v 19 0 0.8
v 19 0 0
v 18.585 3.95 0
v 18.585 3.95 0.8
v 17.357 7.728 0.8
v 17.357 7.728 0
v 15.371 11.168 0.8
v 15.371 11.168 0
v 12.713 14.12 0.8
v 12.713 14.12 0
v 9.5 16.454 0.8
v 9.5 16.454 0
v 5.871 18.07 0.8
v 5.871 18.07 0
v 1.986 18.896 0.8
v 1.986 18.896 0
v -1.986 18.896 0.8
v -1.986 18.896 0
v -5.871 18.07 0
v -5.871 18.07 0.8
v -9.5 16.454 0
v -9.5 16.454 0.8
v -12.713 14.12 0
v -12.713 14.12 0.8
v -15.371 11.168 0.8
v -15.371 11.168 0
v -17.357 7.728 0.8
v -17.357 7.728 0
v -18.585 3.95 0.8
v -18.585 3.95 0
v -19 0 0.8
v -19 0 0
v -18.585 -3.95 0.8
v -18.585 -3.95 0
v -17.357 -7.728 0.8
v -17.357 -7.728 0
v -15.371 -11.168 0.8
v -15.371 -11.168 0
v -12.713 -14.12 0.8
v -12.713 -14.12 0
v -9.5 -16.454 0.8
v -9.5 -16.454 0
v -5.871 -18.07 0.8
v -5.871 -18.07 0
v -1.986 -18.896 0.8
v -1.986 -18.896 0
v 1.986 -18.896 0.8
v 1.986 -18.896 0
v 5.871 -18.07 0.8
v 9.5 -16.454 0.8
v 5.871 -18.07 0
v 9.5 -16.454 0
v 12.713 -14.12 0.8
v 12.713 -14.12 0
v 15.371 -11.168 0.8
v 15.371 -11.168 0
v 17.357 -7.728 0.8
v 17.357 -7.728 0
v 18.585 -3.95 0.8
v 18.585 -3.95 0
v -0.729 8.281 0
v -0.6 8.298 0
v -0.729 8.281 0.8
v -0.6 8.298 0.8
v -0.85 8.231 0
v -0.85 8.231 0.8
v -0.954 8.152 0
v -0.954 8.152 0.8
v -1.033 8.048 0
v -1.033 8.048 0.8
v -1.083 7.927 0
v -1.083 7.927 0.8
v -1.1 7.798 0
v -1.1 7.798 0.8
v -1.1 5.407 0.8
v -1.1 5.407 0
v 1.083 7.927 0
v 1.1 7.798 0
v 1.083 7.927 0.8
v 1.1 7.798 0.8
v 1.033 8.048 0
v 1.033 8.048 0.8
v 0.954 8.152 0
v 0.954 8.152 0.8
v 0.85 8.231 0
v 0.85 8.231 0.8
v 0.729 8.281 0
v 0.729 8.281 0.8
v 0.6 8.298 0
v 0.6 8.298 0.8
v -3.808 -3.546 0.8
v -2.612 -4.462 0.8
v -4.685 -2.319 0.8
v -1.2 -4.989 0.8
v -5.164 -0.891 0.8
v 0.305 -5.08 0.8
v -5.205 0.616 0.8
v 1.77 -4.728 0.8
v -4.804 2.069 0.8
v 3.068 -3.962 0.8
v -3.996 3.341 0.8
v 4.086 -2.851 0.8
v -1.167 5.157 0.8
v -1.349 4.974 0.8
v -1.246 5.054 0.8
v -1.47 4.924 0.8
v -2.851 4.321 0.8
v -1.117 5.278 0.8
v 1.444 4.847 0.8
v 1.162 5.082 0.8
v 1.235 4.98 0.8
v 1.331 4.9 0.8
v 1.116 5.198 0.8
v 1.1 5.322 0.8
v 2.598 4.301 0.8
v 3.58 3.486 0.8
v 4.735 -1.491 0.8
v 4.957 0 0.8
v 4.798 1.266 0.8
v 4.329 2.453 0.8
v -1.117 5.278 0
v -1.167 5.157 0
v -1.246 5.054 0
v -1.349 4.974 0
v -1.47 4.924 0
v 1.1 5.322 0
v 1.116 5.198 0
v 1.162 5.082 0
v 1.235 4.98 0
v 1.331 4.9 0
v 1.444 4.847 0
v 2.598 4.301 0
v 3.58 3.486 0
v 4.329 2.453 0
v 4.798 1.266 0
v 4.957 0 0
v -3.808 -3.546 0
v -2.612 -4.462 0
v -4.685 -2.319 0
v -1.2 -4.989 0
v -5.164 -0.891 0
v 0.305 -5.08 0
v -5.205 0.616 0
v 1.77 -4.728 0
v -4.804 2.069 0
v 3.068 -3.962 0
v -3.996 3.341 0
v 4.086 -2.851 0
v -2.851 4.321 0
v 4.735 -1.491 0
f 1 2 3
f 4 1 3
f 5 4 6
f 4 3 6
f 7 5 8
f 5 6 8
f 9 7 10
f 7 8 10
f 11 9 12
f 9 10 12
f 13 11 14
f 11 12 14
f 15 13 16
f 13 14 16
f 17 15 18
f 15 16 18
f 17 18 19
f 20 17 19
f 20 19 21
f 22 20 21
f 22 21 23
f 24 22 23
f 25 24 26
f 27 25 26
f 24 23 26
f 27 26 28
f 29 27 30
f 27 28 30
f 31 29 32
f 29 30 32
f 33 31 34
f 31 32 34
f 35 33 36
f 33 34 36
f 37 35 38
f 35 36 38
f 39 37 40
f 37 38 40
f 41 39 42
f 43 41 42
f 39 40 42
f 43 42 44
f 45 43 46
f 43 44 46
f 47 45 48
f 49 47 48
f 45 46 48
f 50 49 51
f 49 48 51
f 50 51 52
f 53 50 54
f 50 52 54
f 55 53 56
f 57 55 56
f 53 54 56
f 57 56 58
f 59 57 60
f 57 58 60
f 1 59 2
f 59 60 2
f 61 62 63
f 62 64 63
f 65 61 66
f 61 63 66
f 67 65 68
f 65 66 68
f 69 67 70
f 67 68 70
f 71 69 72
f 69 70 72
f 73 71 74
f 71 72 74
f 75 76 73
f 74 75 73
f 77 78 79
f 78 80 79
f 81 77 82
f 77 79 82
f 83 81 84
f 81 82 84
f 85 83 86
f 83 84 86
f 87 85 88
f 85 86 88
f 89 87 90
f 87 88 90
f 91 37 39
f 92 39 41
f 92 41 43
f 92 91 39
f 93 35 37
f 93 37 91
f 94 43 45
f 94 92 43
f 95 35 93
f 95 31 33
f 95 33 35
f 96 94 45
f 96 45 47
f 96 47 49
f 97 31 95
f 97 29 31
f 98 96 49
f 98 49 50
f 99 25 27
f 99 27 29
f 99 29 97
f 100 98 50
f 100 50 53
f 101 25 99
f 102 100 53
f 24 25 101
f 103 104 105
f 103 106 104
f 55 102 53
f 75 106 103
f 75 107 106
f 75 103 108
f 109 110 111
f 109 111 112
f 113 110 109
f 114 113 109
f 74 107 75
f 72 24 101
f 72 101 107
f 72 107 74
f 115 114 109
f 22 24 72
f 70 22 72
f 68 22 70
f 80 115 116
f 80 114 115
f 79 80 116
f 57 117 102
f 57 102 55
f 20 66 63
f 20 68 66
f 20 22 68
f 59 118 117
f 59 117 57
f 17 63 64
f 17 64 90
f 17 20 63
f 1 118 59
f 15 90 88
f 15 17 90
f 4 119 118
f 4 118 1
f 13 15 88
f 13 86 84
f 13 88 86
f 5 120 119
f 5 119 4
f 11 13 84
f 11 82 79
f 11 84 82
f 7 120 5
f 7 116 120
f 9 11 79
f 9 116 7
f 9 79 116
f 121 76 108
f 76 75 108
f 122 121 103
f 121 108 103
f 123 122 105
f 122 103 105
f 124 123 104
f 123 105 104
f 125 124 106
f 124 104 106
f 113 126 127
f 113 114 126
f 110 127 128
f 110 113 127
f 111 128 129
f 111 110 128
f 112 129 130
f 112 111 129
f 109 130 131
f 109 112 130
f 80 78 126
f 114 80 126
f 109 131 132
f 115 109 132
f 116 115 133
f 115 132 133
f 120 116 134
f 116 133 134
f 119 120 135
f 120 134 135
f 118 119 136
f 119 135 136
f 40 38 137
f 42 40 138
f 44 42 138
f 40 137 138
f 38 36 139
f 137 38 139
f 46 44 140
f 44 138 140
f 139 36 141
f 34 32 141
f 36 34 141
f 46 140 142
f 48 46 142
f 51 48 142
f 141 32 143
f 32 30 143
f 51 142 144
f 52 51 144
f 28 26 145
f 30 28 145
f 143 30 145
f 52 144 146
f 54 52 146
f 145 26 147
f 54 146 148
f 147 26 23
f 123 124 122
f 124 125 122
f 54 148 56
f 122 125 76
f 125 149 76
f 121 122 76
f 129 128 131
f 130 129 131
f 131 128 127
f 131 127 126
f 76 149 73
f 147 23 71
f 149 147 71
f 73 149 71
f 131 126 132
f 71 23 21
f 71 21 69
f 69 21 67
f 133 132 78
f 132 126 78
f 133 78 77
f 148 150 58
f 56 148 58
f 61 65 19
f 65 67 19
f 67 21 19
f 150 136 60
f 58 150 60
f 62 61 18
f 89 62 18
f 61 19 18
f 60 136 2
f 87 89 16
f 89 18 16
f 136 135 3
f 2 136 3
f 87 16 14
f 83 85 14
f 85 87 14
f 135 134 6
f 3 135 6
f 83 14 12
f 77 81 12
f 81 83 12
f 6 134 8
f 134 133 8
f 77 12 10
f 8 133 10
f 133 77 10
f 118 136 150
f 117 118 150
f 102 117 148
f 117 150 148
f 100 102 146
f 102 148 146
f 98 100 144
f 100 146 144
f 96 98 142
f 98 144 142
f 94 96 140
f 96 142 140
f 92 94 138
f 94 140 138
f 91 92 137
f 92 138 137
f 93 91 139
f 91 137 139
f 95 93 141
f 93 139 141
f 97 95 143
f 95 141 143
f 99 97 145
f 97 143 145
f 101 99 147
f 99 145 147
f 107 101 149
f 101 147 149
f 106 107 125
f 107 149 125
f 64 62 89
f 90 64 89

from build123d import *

# Parameters (mm, degrees)
F0_R     = 19
F1_DEPTH = 0.8
F2_R     = 0.5


with BuildPart() as f1:
    # F0 (on Top) → F1 (new body)
    with BuildSketch(Plane.XY):
        Circle(F0_R)
        with BuildLine():
            ThreePointArc((1.1, 4.946329), (3.879108, 3.136336), (4.957492, 0))
            ThreePointArc((4.957492, 0), (-3.392645, -3.930217), (-1.1, 5.009312))
            Line((-1.1, 5.009312), (-1.1, 8.298009))
            Line((-1.1, 8.298009), (1.1, 8.298009))
            Line((1.1, 8.298009), (1.1, 4.946329))
        make_face(mode=Mode.SUBTRACT)
    extrude(amount=F1_DEPTH)

    # F2
    f2_edges = [f1.edges().sort_by_distance(p)[0] for p in [
        (1.1, 4.946329, 0.4),
        (1.1, 8.298009, 0.4),
        (-1.1, 8.298009, 0.4),
        (-1.1, 5.009312, 0.4),
    ]]
    fillet(f2_edges, radius=F2_R)


solid = f1.part
